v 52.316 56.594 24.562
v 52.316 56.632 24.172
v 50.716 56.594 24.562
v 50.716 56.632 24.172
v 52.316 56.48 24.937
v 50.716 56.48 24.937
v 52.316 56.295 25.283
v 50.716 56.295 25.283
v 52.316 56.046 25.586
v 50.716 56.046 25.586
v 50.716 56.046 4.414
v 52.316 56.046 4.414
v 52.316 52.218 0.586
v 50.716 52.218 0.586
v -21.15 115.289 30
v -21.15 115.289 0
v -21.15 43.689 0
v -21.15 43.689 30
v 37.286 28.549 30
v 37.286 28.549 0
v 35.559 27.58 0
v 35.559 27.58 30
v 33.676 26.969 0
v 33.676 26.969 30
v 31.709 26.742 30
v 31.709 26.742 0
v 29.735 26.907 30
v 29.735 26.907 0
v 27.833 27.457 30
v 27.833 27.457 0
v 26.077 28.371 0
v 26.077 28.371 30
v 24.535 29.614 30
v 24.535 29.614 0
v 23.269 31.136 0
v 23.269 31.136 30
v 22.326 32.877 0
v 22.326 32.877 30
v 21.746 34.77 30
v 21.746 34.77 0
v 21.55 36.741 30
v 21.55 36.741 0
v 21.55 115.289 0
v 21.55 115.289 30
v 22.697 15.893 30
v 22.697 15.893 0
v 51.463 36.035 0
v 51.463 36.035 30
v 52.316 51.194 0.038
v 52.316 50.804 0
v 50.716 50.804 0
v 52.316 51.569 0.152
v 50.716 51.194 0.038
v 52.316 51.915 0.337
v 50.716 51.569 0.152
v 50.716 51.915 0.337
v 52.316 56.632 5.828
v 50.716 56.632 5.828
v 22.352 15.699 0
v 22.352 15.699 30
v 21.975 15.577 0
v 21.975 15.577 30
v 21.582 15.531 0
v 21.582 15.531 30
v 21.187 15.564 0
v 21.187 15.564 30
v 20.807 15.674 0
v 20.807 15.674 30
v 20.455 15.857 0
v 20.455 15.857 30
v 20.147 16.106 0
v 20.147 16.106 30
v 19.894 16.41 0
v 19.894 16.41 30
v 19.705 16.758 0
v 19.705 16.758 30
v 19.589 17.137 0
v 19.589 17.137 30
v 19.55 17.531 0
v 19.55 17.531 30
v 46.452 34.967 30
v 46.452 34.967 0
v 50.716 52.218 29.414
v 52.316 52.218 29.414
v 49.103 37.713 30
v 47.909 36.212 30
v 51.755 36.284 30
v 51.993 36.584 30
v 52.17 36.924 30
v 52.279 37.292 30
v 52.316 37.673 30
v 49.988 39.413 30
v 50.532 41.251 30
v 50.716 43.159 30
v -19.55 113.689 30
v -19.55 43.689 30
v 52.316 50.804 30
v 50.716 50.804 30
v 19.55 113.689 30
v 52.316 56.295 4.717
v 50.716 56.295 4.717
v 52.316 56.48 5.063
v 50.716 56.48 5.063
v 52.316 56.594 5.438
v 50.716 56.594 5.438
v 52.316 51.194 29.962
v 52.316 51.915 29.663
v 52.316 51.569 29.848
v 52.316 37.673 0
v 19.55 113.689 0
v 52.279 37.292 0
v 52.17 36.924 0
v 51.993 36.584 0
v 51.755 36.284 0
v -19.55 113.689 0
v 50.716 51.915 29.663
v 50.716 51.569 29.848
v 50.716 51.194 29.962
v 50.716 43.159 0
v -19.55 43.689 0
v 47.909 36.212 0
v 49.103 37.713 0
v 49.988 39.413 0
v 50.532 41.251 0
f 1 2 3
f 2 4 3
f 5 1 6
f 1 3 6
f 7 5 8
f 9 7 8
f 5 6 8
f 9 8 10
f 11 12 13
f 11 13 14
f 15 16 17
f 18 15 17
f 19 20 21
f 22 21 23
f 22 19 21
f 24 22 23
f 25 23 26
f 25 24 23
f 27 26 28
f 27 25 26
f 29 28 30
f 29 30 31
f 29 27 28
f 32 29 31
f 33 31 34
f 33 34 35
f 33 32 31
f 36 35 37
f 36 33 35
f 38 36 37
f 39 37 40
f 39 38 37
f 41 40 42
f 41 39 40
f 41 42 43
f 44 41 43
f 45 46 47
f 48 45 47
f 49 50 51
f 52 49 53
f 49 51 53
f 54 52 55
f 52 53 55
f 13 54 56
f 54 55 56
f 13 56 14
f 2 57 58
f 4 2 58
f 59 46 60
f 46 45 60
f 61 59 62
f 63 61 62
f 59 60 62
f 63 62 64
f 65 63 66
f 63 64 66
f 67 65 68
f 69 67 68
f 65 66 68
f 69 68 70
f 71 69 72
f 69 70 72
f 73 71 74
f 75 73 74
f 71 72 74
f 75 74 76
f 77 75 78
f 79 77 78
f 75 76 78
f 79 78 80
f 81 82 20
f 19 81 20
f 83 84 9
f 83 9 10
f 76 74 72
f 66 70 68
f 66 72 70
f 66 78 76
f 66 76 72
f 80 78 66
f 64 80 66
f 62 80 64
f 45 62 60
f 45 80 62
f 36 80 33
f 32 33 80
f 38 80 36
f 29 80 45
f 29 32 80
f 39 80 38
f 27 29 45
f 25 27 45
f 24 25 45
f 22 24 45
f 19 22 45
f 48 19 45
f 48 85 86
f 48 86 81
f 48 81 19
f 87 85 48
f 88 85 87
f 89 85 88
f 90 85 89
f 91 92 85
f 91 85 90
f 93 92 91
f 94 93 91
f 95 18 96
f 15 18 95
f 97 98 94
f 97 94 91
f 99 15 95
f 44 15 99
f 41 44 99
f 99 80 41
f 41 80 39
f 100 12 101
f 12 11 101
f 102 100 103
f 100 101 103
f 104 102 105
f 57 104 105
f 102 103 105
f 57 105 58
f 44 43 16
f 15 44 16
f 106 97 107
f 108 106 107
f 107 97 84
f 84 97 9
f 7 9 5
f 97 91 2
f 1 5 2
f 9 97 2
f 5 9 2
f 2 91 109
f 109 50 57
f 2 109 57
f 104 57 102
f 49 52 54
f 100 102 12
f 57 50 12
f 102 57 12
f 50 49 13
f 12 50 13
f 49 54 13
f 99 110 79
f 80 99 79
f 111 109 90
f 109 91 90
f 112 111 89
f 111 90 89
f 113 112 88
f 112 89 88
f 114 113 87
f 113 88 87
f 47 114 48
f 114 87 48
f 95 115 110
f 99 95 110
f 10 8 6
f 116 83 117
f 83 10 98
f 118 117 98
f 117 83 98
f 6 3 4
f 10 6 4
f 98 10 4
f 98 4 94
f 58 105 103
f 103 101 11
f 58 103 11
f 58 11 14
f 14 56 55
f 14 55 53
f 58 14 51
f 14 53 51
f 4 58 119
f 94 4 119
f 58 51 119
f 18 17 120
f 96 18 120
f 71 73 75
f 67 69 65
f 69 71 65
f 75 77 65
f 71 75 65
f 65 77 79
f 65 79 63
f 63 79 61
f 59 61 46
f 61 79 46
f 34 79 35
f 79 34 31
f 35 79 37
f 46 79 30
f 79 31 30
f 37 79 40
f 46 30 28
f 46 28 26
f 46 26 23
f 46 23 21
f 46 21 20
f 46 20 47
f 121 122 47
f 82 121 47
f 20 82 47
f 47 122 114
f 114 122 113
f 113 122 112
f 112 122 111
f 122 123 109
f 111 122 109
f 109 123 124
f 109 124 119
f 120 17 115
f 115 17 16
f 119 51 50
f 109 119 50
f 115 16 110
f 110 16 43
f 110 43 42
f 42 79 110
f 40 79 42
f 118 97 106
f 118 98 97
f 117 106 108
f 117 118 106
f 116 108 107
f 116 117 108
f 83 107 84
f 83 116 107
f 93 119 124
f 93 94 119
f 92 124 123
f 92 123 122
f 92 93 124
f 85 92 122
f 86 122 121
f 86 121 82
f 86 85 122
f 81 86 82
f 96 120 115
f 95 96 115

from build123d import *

# Parameters (mm, degrees)
BOSS_EXTRU_1_DEPTH = 30
CONG_1_R           = 10
CHANFREIN1_SIZE    = 5
CONG_2_R           = 2


with BuildPart() as part:
    # Esquisse1 → Boss.-Extru.1 (new body)
    with BuildSketch(Plane.XY):
        Polygon((-19.55, 43.689057372), (-19.55, 113.689057372), (19.55, 113.689057372), (19.55, 13.689057372), (52.316081772, 36.632114826), (52.316081772, 56.632114826), (50.716081772, 56.632114826), (50.716081772, 37.953331942), (21.55, 17.531021626), (21.55, 115.289057372), (-21.15, 115.289057372), (-21.15, 43.689057372), align=None)
    extrude(amount=BOSS_EXTRU_1_DEPTH)

    # Congé1
    cong_1_edges = [part.edges().sort_by_distance(p)[0] for p in [
        (21.55, 17.531021626, 15),
        (50.716081772, 37.953331942, 15),
    ]]
    fillet(cong_1_edges, radius=CONG_1_R)

    # Chanfrein1
    chanfrein1_edges = [part.edges().sort_by_distance(p)[0] for p in [
        (51.516081772, 56.632114826, 0),
        (51.516081772, 56.632114826, 30),
    ]]
    chamfer(chanfrein1_edges, length=CHANFREIN1_SIZE)

    # Congé2
    cong_2_edges = [part.edges().sort_by_distance(p)[0] for p in [
        (52.316081772, 36.632114826, 15),
        (19.55, 13.689057372, 15),
        (51.516081772, 56.632114826, 25),
        (51.516081772, 56.632114826, 5),
        (51.516081772, 51.632114826, 0),
        (51.516081772, 51.632114826, 30),
    ]]
    fillet(cong_2_edges, radius=CONG_2_R)


solid = part.part
